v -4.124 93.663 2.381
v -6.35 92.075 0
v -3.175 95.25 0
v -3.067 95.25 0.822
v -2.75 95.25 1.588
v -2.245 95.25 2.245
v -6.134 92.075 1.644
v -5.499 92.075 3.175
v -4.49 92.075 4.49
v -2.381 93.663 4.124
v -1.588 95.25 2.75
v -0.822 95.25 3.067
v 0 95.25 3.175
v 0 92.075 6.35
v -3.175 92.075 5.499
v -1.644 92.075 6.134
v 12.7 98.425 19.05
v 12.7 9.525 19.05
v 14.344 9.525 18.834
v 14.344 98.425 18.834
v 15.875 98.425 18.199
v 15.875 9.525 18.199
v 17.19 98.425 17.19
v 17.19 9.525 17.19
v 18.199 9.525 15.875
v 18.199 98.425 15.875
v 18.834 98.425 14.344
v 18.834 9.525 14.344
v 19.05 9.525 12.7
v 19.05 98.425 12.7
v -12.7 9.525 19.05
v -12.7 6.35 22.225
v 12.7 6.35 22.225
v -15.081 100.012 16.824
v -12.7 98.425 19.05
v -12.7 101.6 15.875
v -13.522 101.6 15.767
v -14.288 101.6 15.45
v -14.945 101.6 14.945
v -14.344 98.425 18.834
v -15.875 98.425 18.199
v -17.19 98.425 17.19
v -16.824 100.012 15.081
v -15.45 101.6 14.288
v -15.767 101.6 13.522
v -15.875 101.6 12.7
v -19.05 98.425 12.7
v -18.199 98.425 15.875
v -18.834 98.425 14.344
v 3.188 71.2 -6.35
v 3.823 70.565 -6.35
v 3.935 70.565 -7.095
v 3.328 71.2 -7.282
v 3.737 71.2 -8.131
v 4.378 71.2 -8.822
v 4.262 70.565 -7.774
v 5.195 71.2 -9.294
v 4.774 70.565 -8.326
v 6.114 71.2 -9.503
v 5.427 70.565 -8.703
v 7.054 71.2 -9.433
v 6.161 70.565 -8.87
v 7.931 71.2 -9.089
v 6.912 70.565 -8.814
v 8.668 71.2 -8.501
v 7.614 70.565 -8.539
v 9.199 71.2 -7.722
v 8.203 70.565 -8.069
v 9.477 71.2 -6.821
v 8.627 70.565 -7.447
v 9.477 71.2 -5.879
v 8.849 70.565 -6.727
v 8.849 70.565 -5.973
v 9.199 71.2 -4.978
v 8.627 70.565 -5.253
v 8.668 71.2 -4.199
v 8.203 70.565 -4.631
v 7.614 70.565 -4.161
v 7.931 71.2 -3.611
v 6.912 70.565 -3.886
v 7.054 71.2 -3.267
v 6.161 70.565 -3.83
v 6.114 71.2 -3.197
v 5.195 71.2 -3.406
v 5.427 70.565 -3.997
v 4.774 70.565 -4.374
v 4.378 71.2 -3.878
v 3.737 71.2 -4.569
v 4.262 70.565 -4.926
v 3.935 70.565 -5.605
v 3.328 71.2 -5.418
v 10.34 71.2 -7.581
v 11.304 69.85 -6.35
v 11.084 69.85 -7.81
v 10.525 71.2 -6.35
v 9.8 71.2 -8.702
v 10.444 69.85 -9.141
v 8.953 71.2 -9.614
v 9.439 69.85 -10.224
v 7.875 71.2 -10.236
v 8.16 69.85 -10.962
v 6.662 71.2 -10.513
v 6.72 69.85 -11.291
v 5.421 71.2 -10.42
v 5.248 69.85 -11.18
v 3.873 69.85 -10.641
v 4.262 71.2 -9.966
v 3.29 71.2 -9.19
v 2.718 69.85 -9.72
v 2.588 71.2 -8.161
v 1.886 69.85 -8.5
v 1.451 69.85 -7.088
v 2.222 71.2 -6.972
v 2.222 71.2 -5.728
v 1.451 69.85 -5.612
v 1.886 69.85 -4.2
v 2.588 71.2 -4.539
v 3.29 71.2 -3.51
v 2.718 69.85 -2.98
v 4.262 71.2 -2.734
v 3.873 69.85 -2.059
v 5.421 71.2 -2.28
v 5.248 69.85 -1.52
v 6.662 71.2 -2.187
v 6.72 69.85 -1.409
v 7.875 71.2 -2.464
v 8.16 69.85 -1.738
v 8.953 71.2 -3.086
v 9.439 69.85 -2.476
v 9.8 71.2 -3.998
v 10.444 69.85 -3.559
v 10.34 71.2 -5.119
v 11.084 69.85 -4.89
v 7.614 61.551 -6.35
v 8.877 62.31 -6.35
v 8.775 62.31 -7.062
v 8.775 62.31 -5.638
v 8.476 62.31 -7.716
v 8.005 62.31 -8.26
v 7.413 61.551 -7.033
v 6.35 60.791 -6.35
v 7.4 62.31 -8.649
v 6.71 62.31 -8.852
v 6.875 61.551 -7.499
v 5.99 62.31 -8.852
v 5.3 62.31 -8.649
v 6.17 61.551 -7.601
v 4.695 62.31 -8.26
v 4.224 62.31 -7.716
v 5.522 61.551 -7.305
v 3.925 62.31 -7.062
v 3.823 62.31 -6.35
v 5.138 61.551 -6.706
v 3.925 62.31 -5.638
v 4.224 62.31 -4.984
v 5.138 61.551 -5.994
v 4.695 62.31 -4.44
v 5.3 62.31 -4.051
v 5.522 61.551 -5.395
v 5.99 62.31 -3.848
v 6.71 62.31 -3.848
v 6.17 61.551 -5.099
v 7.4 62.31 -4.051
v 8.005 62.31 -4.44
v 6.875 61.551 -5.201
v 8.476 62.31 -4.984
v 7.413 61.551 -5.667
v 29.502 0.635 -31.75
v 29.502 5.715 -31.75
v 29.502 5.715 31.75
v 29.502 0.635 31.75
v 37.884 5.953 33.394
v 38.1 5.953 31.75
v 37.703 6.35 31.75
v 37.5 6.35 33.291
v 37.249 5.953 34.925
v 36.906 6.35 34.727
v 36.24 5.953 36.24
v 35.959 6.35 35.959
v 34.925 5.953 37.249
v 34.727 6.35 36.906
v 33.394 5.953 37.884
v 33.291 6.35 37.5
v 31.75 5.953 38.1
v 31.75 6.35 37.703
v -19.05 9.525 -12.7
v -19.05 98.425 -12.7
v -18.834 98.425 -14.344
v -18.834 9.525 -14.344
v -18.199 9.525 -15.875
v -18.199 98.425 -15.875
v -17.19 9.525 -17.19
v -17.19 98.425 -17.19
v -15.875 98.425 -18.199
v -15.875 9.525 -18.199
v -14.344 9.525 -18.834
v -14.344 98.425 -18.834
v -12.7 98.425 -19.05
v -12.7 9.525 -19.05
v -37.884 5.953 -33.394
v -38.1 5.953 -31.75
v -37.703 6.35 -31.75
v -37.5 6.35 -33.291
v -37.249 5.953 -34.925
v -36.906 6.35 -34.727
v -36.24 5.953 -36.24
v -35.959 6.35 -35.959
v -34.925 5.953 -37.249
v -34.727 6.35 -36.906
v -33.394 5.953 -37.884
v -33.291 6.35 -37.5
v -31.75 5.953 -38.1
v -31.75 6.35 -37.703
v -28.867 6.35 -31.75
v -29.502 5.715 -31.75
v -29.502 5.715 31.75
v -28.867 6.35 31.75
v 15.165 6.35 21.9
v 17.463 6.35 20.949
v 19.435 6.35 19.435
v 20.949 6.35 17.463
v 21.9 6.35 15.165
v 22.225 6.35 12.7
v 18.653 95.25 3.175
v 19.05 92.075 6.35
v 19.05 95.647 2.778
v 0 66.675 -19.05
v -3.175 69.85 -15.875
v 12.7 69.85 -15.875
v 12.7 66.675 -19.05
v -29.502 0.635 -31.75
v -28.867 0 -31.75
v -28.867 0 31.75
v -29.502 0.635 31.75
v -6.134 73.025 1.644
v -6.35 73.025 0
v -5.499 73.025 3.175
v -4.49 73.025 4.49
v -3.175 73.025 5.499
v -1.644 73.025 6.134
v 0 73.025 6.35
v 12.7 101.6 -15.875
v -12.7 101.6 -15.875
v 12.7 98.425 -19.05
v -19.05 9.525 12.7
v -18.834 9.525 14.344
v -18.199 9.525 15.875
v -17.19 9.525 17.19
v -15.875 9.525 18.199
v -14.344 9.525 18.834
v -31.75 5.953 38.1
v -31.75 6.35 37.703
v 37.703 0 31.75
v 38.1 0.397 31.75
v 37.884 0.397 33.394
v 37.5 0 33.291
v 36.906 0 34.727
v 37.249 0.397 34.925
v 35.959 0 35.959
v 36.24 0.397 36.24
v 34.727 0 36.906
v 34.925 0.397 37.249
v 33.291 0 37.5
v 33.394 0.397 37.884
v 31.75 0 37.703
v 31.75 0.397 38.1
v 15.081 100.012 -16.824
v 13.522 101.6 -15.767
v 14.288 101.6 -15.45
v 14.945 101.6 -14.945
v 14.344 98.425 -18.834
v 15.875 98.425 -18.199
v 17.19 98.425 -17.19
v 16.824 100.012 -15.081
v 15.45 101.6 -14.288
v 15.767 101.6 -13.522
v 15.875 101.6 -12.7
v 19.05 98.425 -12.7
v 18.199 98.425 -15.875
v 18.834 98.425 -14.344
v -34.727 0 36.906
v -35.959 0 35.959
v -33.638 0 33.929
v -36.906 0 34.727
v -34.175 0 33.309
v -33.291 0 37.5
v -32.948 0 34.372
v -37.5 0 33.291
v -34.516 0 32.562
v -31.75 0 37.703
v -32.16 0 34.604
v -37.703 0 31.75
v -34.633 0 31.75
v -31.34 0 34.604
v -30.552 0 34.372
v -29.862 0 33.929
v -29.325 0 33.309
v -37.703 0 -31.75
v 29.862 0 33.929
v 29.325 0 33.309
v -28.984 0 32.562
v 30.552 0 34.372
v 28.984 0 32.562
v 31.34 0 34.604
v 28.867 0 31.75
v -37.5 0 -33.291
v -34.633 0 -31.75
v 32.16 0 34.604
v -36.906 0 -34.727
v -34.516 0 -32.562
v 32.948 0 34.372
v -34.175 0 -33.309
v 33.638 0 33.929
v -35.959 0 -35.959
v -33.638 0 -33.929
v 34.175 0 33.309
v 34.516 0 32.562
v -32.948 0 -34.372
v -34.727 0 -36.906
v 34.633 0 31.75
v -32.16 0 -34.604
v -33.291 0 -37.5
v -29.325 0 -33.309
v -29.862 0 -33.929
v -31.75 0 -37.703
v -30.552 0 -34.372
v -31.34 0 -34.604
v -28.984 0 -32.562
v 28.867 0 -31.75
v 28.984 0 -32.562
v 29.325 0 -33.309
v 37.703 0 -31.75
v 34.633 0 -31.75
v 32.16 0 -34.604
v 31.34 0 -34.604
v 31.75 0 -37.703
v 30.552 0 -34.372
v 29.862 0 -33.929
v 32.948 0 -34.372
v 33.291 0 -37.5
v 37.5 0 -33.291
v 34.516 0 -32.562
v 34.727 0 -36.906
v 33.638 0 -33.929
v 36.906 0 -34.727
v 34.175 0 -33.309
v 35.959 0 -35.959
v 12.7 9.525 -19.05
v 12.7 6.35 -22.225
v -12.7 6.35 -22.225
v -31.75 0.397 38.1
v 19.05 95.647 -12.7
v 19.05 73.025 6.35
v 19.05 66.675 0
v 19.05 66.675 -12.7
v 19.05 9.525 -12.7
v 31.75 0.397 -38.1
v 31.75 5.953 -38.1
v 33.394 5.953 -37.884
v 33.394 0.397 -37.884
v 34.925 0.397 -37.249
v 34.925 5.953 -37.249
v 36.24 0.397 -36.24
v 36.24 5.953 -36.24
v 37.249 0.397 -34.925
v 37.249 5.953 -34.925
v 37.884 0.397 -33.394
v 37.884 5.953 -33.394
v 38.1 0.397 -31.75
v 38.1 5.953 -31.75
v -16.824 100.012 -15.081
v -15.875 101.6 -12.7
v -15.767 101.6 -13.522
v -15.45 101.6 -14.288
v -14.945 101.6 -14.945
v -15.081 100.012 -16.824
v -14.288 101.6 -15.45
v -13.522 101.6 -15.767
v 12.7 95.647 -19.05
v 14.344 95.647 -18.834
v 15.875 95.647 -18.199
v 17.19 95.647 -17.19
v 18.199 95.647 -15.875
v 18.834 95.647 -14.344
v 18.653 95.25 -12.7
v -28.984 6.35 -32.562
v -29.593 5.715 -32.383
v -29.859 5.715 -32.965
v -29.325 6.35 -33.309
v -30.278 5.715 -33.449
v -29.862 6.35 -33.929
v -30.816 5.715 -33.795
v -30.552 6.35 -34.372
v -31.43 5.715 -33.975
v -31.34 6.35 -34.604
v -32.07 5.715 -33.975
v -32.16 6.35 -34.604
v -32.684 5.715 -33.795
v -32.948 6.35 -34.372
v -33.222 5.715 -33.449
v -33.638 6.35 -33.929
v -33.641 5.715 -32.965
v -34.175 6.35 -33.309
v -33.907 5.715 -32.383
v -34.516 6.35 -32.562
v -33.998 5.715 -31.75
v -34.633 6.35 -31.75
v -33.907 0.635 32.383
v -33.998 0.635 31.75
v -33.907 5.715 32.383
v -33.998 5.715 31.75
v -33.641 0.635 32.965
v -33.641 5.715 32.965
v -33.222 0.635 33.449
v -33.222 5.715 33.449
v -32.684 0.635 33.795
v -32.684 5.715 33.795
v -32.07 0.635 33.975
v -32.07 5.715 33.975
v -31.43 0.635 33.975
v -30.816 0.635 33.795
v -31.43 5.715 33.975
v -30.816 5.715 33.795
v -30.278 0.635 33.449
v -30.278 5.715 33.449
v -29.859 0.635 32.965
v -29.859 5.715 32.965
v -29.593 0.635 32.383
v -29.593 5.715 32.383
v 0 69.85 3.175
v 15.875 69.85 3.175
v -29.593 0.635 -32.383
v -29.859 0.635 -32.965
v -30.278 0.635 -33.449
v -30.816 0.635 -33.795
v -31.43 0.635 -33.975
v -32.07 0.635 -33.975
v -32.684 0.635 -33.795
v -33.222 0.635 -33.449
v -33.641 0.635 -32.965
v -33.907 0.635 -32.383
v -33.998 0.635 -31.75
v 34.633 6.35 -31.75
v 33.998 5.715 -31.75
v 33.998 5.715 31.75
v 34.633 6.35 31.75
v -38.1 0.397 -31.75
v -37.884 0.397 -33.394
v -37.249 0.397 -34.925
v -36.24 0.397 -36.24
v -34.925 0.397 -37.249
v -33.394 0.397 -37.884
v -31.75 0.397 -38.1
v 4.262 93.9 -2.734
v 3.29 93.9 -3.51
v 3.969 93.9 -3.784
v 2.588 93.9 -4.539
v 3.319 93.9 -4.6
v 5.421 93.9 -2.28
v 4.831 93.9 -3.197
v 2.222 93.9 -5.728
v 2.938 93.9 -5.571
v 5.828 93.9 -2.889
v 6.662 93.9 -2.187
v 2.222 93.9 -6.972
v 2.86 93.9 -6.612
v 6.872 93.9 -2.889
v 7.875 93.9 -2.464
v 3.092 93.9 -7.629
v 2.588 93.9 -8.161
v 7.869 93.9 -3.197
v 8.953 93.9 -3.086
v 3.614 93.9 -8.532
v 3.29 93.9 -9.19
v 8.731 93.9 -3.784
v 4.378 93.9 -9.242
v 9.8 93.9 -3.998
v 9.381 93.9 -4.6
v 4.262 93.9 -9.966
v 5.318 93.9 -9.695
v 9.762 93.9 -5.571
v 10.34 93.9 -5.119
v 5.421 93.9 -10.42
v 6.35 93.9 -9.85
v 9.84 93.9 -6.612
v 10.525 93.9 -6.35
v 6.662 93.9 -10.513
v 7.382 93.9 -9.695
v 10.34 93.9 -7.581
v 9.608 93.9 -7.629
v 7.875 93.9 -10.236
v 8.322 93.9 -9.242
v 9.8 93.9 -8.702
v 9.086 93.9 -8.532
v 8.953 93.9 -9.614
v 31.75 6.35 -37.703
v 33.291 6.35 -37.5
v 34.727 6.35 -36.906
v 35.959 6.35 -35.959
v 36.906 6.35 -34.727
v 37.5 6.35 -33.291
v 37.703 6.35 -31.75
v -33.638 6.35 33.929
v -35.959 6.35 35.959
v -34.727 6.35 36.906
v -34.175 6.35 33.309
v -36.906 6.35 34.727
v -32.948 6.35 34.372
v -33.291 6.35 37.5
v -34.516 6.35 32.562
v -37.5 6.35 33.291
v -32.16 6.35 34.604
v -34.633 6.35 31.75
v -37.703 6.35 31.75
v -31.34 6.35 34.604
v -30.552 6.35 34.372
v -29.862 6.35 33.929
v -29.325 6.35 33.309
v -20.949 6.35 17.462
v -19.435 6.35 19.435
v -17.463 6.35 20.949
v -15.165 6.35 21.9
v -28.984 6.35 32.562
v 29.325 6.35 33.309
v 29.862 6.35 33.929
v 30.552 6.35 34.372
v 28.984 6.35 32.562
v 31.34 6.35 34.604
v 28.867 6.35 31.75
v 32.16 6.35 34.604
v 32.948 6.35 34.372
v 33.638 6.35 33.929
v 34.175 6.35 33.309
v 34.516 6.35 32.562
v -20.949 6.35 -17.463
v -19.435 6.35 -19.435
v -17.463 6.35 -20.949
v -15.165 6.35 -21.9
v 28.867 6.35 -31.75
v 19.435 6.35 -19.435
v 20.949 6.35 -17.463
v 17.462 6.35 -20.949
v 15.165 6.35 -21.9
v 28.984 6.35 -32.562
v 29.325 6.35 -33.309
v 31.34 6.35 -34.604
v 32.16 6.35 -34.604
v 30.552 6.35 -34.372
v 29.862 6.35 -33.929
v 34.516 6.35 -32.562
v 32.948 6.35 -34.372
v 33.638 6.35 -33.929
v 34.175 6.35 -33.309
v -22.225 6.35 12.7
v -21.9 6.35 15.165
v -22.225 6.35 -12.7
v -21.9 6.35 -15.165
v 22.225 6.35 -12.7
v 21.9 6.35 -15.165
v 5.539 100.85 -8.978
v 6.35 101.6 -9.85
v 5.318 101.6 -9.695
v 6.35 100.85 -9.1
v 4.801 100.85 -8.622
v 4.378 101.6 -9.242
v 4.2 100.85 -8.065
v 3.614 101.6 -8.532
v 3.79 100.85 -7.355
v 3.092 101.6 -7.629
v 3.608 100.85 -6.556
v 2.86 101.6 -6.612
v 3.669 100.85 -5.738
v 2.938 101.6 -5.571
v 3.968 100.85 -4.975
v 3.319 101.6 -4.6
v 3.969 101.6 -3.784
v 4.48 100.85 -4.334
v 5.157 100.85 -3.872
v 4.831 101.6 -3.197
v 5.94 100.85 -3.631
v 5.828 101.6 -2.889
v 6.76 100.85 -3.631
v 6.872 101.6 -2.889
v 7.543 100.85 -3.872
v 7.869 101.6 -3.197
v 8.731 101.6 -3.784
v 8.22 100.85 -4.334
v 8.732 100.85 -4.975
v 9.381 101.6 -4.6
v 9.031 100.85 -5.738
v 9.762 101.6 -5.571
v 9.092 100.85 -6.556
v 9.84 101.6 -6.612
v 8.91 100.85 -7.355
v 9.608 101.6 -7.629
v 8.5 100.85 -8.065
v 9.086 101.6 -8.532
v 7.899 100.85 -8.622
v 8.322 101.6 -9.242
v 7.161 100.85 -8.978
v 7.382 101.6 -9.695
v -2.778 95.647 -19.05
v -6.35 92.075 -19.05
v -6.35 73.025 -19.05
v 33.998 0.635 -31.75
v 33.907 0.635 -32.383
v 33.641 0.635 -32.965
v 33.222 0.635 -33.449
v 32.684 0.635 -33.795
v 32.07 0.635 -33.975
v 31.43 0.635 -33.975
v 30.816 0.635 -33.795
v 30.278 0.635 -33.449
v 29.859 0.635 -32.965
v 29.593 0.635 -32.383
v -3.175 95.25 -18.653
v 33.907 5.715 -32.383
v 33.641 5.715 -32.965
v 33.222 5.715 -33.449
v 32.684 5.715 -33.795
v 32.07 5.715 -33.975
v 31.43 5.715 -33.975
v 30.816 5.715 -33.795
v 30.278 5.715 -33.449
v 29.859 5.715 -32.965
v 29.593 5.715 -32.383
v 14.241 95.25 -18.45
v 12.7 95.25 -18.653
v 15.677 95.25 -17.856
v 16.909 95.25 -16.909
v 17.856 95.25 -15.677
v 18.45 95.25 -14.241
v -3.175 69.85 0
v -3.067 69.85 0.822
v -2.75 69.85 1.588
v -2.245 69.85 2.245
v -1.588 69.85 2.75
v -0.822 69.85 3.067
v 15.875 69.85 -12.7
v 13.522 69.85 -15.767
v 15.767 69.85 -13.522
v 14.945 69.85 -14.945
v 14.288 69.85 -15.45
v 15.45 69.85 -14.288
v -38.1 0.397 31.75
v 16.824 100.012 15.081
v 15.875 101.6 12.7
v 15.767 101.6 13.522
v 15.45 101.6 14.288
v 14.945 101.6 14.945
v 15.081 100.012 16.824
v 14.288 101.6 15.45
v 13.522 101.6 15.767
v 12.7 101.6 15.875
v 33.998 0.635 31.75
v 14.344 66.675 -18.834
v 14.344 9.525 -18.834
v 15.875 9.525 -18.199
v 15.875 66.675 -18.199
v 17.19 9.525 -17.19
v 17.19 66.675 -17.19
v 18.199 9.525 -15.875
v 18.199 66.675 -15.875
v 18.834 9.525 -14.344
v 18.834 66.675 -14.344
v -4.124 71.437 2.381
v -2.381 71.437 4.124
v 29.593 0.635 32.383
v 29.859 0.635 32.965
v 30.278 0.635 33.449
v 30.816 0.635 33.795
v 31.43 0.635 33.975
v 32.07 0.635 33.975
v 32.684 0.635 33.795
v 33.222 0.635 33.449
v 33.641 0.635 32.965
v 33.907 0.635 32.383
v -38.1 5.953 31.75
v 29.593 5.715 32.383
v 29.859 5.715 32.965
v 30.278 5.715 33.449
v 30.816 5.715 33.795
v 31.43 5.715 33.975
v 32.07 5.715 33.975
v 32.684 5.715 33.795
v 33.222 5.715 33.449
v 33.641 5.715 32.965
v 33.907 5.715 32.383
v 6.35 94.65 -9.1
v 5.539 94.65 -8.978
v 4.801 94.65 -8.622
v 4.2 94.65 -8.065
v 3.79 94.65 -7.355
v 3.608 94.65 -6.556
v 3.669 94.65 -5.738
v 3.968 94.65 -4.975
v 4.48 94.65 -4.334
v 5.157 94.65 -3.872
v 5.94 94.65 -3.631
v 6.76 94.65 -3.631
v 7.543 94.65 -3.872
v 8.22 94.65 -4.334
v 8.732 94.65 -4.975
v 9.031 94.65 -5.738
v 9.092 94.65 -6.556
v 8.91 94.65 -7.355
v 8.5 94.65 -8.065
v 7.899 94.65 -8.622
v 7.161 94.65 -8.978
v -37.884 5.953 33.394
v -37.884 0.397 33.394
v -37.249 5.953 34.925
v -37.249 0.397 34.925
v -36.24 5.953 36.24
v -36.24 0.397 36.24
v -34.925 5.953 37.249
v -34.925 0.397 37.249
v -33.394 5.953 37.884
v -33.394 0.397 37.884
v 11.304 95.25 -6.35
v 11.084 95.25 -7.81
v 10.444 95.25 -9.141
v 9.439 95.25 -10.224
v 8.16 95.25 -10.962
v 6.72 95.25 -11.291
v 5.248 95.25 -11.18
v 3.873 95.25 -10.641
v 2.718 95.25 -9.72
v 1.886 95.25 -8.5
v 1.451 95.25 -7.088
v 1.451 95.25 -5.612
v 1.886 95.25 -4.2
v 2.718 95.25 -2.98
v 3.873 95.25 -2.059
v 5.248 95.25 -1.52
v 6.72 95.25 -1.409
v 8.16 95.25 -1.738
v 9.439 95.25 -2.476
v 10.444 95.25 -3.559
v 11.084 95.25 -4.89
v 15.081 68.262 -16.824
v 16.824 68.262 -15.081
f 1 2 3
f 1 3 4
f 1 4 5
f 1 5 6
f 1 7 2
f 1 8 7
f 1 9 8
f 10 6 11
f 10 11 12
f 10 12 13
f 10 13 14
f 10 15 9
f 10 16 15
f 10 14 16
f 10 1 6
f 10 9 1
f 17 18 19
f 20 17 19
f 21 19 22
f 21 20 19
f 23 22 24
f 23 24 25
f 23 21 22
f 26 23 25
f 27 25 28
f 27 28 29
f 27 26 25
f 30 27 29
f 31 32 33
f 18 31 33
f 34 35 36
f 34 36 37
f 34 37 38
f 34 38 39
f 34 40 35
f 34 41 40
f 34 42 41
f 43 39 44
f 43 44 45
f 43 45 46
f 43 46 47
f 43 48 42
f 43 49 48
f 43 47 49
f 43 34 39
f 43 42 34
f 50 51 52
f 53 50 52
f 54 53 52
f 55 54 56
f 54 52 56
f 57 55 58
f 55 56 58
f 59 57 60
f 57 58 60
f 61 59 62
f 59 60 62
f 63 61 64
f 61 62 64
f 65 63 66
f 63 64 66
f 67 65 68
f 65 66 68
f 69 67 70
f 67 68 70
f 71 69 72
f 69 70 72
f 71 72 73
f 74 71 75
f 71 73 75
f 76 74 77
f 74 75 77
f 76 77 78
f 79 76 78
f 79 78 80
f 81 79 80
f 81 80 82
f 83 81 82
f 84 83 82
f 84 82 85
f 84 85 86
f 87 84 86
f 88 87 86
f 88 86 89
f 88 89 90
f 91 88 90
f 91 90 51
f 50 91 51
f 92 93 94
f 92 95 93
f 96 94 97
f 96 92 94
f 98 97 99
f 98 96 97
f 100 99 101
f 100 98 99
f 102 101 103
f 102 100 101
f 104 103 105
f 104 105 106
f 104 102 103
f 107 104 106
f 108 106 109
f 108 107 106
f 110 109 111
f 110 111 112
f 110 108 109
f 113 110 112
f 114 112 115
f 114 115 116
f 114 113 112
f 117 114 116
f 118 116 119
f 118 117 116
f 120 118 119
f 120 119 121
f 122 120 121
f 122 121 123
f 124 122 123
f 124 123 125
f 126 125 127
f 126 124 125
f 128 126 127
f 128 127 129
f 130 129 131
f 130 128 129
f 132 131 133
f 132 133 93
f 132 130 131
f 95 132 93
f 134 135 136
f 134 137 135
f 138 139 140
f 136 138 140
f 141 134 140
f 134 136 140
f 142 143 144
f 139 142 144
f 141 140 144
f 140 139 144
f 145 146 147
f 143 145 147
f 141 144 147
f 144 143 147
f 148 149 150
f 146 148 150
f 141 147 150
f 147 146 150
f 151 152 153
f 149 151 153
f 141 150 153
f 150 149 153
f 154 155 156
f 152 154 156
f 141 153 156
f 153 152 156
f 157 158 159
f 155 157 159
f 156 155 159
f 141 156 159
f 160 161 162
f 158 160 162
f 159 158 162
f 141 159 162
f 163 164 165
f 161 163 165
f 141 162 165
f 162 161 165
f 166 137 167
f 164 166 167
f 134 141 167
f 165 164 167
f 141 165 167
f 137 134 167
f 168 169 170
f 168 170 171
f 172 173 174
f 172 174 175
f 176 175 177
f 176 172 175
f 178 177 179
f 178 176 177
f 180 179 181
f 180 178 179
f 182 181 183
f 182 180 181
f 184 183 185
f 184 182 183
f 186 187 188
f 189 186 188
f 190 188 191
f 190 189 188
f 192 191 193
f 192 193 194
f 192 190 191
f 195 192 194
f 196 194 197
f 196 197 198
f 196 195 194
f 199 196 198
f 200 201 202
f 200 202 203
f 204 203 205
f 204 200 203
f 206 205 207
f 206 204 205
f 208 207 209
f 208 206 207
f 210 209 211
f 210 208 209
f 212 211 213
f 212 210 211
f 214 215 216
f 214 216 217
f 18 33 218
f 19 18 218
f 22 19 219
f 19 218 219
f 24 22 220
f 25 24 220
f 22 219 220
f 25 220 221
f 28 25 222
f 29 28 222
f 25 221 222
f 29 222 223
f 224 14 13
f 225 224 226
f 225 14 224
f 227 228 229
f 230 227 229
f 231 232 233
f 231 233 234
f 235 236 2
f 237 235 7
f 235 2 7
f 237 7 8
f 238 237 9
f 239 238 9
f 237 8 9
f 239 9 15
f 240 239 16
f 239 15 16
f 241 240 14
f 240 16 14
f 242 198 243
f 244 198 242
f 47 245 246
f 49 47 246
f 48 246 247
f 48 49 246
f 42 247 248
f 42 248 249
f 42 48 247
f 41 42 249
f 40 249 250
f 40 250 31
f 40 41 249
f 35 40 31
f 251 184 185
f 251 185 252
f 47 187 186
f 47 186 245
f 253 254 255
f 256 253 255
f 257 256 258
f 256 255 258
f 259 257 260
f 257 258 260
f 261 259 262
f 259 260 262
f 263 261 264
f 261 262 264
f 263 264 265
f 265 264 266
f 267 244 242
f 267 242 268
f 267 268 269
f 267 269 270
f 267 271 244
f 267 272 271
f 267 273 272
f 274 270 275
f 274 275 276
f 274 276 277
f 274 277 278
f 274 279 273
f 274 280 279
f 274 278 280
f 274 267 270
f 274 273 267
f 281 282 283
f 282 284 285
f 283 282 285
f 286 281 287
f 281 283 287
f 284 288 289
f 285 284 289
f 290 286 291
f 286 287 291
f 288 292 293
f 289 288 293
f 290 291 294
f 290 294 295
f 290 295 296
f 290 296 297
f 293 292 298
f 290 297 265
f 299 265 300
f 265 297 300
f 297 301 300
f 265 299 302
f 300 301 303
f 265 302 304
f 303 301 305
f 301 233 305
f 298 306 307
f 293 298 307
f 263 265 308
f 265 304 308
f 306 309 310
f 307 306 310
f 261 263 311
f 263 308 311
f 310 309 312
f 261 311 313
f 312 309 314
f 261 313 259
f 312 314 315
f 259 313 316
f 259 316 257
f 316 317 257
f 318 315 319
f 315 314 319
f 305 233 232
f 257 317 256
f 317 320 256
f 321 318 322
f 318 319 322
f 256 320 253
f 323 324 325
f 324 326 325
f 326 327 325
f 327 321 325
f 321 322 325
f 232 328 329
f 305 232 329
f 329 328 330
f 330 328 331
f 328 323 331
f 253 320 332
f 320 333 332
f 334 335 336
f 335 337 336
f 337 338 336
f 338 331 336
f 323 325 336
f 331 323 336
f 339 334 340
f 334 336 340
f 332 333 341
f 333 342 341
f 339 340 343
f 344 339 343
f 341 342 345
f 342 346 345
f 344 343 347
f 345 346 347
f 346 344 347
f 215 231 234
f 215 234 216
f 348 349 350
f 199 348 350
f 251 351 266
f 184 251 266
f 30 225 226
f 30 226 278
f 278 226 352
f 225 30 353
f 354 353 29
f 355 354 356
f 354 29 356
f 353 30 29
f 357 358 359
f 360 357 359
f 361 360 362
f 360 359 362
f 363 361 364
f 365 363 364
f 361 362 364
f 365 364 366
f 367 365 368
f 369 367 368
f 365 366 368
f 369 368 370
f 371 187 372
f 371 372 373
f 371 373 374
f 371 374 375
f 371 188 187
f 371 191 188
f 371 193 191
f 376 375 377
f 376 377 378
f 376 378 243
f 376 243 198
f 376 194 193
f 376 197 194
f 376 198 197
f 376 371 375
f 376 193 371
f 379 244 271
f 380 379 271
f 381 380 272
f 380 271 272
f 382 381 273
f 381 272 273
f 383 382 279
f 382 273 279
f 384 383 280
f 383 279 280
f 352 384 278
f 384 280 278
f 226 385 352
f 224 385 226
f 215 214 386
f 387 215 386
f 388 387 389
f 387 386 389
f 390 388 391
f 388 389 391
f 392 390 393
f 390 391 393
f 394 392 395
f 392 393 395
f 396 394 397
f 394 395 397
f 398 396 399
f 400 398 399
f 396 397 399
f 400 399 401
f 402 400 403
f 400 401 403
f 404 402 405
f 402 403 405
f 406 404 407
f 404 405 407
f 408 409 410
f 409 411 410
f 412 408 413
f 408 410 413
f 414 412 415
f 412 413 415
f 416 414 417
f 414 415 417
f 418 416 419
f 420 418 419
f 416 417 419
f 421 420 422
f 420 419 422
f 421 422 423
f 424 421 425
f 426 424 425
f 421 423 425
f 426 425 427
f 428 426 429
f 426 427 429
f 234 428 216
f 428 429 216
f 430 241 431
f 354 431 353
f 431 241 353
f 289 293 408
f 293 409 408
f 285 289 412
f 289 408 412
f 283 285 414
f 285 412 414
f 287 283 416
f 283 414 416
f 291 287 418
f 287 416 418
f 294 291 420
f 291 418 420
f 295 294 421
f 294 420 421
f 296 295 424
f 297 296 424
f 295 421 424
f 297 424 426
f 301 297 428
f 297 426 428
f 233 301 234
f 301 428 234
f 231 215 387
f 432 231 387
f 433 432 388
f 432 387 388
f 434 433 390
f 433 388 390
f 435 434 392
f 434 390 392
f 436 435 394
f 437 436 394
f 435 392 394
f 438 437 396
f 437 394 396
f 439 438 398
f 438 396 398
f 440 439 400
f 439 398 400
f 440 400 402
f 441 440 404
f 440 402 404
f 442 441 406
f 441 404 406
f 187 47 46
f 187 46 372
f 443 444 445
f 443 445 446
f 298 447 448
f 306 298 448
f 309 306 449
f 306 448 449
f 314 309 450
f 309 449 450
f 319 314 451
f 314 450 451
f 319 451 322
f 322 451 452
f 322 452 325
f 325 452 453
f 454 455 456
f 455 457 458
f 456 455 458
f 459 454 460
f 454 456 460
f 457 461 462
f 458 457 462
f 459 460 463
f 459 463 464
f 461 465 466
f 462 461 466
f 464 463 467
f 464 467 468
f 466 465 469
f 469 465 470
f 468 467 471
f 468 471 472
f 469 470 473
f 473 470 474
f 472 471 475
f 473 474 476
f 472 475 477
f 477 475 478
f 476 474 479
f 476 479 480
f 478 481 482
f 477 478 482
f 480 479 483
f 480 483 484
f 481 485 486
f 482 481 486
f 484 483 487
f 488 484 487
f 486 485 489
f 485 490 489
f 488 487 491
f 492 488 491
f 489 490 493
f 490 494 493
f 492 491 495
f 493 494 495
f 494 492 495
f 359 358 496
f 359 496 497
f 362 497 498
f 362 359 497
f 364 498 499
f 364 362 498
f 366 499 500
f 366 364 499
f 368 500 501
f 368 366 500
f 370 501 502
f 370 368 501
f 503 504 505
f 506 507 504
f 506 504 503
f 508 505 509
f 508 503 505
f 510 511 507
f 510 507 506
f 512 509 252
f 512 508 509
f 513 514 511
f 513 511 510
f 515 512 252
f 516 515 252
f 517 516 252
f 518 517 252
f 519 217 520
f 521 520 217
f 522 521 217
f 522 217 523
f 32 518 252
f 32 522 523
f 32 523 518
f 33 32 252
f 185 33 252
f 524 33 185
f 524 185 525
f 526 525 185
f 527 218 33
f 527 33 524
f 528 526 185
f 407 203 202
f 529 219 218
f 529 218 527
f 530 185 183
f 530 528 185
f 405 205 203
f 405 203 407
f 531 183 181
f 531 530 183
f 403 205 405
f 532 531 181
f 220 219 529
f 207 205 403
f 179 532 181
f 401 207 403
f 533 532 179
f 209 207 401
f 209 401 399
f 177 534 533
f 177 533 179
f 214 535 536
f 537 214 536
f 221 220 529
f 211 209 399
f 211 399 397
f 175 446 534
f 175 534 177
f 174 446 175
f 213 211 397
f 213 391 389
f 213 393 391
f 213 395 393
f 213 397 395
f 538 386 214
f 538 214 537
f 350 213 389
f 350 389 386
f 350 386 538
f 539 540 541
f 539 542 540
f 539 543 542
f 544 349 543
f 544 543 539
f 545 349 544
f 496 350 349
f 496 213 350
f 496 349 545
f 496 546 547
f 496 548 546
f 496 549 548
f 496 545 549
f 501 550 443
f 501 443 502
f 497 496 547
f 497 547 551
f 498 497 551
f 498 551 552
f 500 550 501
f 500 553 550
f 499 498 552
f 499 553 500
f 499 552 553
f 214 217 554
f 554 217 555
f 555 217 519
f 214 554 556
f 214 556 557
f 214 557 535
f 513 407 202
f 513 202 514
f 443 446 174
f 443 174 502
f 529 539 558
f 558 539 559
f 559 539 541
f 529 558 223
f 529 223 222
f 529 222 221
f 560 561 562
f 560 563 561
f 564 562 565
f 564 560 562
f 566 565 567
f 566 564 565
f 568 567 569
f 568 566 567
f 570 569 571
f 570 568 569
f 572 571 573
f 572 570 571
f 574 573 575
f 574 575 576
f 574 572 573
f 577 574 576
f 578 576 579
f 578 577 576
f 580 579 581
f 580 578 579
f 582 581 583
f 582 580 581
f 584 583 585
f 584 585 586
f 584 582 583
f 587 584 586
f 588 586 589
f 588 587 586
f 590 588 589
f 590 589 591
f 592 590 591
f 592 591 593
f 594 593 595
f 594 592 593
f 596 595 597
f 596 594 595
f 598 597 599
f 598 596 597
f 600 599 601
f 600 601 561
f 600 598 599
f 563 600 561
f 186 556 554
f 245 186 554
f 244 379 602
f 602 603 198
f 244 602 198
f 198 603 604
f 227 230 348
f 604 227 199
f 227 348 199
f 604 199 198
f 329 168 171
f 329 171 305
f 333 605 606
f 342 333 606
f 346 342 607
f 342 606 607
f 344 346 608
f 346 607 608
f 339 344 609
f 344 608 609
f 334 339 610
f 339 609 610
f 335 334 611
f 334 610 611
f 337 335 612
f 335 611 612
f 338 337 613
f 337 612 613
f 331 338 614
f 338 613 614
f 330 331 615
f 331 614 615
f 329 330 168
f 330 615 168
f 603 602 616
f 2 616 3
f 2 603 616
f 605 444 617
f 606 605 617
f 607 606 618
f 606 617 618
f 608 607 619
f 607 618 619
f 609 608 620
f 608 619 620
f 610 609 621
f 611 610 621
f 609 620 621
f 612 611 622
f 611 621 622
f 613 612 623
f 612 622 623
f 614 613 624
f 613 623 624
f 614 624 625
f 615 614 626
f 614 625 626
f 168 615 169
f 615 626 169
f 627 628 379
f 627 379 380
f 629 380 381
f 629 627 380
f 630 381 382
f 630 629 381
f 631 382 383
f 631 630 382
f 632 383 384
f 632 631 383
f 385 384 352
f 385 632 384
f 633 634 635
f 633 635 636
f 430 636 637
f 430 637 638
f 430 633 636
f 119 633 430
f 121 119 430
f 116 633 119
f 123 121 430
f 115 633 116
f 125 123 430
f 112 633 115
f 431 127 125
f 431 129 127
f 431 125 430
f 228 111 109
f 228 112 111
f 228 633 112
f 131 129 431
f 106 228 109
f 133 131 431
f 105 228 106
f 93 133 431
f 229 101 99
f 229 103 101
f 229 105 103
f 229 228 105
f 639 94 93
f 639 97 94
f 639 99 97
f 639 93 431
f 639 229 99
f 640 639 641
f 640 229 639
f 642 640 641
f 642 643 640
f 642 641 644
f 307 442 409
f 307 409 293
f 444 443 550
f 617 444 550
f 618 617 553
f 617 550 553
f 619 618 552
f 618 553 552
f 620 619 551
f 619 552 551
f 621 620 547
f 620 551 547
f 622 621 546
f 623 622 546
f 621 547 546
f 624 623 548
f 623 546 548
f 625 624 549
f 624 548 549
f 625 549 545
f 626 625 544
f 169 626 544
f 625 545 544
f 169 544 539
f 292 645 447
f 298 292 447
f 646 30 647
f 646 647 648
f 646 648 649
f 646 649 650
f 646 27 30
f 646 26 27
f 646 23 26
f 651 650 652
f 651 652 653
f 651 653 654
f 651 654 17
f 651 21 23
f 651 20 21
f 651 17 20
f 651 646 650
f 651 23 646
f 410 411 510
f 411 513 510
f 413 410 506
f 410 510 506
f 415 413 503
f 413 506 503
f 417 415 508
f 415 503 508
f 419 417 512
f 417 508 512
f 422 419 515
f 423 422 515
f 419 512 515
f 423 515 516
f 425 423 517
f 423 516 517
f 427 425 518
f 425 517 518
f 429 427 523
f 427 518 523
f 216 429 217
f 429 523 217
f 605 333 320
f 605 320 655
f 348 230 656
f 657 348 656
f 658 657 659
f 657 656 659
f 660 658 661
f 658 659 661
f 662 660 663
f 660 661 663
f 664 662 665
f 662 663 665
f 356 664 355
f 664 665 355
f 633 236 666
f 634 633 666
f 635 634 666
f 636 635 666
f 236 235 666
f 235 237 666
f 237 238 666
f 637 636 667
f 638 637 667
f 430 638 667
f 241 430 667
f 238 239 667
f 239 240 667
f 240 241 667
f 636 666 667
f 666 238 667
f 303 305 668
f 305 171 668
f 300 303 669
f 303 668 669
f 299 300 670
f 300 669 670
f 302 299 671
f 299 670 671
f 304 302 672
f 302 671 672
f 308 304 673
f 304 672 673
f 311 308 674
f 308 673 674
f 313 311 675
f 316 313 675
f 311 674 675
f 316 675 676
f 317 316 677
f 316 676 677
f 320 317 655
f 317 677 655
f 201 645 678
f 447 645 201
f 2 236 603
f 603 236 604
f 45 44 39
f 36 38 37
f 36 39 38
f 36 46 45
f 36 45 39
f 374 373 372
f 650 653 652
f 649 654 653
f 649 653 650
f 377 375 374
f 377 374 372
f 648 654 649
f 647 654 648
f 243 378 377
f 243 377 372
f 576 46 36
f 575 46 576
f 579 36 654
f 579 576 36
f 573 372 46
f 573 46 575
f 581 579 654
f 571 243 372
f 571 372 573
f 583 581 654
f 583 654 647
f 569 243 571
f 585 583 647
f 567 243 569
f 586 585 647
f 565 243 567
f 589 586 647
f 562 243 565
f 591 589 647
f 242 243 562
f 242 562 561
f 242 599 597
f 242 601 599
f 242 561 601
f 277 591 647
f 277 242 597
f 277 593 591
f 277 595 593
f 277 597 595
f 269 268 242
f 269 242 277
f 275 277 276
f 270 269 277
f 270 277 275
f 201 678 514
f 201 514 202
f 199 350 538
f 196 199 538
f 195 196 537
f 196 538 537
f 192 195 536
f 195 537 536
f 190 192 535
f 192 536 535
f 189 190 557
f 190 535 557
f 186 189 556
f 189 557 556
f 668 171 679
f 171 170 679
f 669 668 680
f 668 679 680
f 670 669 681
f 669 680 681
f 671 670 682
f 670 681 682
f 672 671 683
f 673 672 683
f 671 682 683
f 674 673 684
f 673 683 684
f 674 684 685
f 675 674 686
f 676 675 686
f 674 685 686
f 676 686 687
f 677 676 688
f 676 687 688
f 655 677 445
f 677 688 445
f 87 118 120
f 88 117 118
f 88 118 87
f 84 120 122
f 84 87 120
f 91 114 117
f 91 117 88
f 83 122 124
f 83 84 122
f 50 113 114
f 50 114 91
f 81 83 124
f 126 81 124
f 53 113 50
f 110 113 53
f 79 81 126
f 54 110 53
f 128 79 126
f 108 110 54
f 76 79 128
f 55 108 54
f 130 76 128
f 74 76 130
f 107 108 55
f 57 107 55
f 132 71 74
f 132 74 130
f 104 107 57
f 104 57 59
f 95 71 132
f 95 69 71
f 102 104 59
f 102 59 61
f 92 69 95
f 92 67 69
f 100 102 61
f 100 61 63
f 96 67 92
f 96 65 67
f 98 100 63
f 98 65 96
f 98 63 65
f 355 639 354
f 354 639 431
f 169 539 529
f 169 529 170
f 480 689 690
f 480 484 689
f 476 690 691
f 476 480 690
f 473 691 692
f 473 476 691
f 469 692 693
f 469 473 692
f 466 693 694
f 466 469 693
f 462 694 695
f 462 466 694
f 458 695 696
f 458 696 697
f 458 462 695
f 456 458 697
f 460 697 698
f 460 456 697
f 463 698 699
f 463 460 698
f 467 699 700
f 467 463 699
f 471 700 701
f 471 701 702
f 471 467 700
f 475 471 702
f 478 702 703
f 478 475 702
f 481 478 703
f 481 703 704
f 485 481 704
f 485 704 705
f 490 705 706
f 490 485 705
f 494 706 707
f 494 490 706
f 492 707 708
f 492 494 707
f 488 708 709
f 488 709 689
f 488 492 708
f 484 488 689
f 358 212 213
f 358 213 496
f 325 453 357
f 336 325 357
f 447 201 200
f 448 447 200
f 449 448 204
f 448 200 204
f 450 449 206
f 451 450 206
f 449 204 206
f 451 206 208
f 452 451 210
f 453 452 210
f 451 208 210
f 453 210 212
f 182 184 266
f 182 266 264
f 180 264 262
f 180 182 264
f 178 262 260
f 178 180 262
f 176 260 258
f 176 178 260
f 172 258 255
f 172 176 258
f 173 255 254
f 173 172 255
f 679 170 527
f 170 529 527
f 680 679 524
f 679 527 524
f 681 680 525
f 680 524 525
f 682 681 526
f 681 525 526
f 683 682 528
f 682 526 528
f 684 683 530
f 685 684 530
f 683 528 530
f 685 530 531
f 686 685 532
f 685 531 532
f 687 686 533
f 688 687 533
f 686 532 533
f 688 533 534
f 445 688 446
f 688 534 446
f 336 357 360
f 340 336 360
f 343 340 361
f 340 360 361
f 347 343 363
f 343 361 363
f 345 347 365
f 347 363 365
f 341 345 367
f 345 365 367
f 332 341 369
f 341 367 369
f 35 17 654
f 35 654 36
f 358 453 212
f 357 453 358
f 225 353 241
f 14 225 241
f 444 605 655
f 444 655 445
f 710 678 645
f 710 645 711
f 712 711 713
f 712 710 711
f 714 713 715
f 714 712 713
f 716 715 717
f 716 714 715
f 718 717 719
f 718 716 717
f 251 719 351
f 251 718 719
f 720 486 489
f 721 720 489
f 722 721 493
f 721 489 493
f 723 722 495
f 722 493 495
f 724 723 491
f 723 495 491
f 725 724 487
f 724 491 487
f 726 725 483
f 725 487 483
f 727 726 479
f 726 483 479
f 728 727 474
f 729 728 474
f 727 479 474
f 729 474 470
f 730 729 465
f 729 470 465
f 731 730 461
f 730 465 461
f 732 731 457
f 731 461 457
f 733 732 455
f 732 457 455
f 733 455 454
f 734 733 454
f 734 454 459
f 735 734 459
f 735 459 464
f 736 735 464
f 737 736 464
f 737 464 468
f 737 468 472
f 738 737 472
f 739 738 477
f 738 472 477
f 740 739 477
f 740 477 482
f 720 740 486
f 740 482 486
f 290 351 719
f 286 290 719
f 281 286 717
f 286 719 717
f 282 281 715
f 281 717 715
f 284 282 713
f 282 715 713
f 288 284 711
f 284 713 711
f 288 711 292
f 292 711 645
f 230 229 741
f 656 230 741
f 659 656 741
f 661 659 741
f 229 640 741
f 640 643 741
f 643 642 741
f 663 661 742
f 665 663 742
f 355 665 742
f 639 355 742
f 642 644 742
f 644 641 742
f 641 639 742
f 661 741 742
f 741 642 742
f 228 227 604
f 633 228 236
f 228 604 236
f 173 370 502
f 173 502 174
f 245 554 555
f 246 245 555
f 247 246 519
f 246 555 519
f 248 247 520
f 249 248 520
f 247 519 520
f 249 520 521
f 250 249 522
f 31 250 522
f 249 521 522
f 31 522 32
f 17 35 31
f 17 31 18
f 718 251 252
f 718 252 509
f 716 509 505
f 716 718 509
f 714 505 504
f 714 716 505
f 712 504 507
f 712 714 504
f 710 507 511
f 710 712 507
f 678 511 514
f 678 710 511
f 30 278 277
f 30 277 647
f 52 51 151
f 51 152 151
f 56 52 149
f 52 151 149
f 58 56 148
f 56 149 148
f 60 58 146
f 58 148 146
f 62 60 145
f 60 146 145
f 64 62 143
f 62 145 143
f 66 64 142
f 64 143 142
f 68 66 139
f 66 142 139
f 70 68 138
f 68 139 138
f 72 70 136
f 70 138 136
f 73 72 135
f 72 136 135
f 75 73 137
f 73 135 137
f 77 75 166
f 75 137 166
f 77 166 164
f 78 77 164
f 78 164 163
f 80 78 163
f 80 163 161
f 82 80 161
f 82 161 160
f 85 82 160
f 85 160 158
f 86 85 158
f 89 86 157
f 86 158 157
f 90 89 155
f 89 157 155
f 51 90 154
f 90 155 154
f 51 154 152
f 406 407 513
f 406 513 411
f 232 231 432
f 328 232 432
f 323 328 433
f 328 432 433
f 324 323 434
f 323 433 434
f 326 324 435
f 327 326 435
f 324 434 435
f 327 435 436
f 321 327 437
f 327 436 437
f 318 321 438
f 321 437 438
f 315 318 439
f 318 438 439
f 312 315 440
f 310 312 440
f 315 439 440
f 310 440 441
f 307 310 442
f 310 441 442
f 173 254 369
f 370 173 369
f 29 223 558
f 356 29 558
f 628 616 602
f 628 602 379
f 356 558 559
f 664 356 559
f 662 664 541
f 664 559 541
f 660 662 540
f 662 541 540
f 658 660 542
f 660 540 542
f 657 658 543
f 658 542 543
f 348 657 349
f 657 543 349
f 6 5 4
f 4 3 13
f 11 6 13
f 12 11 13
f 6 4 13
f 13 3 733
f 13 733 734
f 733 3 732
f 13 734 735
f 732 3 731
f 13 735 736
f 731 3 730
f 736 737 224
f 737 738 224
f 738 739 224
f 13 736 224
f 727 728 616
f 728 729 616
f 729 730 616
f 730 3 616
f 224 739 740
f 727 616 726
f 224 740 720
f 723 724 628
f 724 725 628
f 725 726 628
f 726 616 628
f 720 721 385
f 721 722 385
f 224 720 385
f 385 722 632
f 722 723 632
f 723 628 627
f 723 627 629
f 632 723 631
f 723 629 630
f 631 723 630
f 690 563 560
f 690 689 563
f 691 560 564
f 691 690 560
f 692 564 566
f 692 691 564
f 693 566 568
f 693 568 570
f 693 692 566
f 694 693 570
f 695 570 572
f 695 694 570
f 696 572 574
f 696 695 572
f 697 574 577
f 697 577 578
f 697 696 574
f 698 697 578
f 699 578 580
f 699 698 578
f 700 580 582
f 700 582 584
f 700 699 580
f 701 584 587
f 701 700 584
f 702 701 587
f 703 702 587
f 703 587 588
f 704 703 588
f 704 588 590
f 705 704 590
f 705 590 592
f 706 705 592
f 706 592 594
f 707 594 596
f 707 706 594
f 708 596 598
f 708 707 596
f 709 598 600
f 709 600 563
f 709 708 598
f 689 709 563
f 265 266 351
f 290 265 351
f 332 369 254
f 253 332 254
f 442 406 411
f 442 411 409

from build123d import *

# Parameters (mm, degrees)
SKETCH1_W                            = 76.2
SKETCH1_H                            = 76.2
BOSS_EXTRUDE1_DEPTH                  = 6.35
SKETCH2_W                            = 38.1
SKETCH2_H                            = 38.1
BOSS_EXTRUDE2_DEPTH                  = 69.85
BOSS_EXTRUDE3_DEPTH                  = 95.25
BOSS_EXTRUDE4_START                  = 95.25
SKETCH2_5_W                          = 25.4
SKETCH2_5_H                          = 25.4
SKETCH2_5_R                          = 4.175
BOSS_EXTRUDE4_DEPTH                  = 6.35
BOSS_EXTRUDE6_START                  = 93.9
SKETCH2_7_R                          = 4.175
BOSS_EXTRUDE6_DEPTH                  = 1.35
BOSS_EXTRUDE6_DRAFT                  = -30
F_8_0_199_DIAMETER_HOLE1_D           = 5.0546
F_8_0_199_DIAMETER_HOLE1_DEPTH       = 8.89
F_8_0_199_DIAMETER_HOLE1_CSINK_D     = 6.3246
F_8_0_199_DIAMETER_HOLE1_CSINK_ANGLE = 90
F_8_0_199_DIAMETER_HOLE1_TIP         = 1.518555042
F_8_START                            = -31.75
F_8_CLEARANCE_SLOT1_DEPTH            = 63.5
FILLET2_R                            = 6.35
CHAMFER2_SIZE                        = 3.175
CHAMFER3_SIZE                        = 3.175
CHAMFER4_SIZE                        = 0.396875


with BuildPart() as part:
    # Sketch1 → Boss-Extrude1 (new body)
    with BuildSketch(Plane(origin=(0, 0, 0), x_dir=(1, 0, 0), z_dir=(0, 1, 0))):
        Rectangle(SKETCH1_W, SKETCH1_H)
    extrude(amount=BOSS_EXTRUDE1_DEPTH)

    # Sketch2 → Boss-Extrude2 (add)
    with BuildSketch(Plane(origin=(0, 0, 0), x_dir=(1, 0, 0), z_dir=(0, 1, 0))):
        Rectangle(SKETCH2_W, SKETCH2_H)
    extrude(amount=BOSS_EXTRUDE2_DEPTH)

    # Sketch2<3> → Boss-Extrude3 (add)
    with BuildSketch(Plane(origin=(0, 0, 0), x_dir=(1, 0, 0), z_dir=(0, 1, 0))):
        Polygon((-19.05, 19.05), (-19.05, -19.05), (19.05, -19.05), (19.05, -6.35), (-6.35, -6.35), (-6.35, 19.05), align=None)
    extrude(amount=BOSS_EXTRUDE3_DEPTH)

    # Sketch2<5> → Boss-Extrude4 (add)
    # profile 1 of 3: a face of its own
    with BuildSketch(Plane(origin=(0, 0, 0), x_dir=(1, 0, 0), z_dir=(0, 1, 0)).offset(BOSS_EXTRUDE4_START)):
        Polygon((-19.05, 19.05), (-19.05, -19.05), (19.05, -19.05), (19.05, -6.35), (-6.35, -6.35), (-6.35, 19.05), align=None)
    # profile 2 of 3: a face of its own
    with BuildSketch(Plane(origin=(0, 0, 0), x_dir=(1, 0, 0), z_dir=(0, 1, 0)).offset(BOSS_EXTRUDE4_START)):
        with Locations((6.35, 6.35)):
            Rectangle(SKETCH2_5_W, SKETCH2_5_H)
        with Locations((6.35, 6.35)):
            Circle(SKETCH2_5_R, mode=Mode.SUBTRACT)
    # profile 3 of 3: a face of its own
    with BuildSketch(Plane(origin=(0, 0, 0), x_dir=(1, 0, 0), z_dir=(0, 1, 0)).offset(BOSS_EXTRUDE4_START)):
        with Locations((6.35, 6.35)):
            Circle(SKETCH2_5_R)
    extrude(amount=BOSS_EXTRUDE4_DEPTH)

    # Boss-Extrude5: read off the stored shape, not the designer's step
    # Boss-Extrude5 outline → Boss-Extrude5 (revolve)
    with BuildSketch(Plane(origin=(6.35, 0, -6.35), x_dir=(1, 0, 0), z_dir=(0, 0, 1))):
        Polygon((4.175, 71.2), (0, 71.2), (0, 69.85), (4.954422863, 69.85), align=None)
    revolve(axis=Axis((6.35, 0, -6.35), (0, 1, 0)))


with BuildPart() as boss_extrude6_tool:
    # Sketch2<7> → Boss-Extrude6 (with draft: the straight prism first)
    with BuildSketch(Plane(origin=(0, 0, 0), x_dir=(1, 0, 0), z_dir=(0, 1, 0)).offset(BOSS_EXTRUDE6_START)):
        with Locations((6.35, 6.35)):
            Circle(SKETCH2_7_R)
    extrude(amount=BOSS_EXTRUDE6_DEPTH)
    # Boss-Extrude6: the draft: its side faces are tilted about the plane it starts from
    boss_extrude6_sides = [boss_extrude6_tool.faces().sort_by_distance(p)[0] for p in [
        (2.175, 94.575, -6.35),
    ]]
    draft(boss_extrude6_sides, Plane(origin=(0, 0, 0), x_dir=(1, 0, 0), z_dir=(0, 1, 0)).offset(BOSS_EXTRUDE6_START), BOSS_EXTRUDE6_DRAFT)


with BuildPart() as part_1:
    add(part.part)

    # Boss-Extrude6: add boss_extrude6_tool
    add(boss_extrude6_tool.part)

    # #8 (0.199) Diameter Hole1
    with Locations(Plane(origin=(0, 71.2, 0), x_dir=(1, 0, 0), z_dir=(0, 1, 0))):
        with Locations((6.35, 6.35)):
            CounterSinkHole(F_8_0_199_DIAMETER_HOLE1_D / 2, F_8_0_199_DIAMETER_HOLE1_CSINK_D / 2, depth=F_8_0_199_DIAMETER_HOLE1_DEPTH, counter_sink_angle=F_8_0_199_DIAMETER_HOLE1_CSINK_ANGLE)
            with Locations((0, 0, -(F_8_0_199_DIAMETER_HOLE1_DEPTH + F_8_0_199_DIAMETER_HOLE1_TIP / 2))):  # 118° drill point
                Cone(0, F_8_0_199_DIAMETER_HOLE1_D / 2, F_8_0_199_DIAMETER_HOLE1_TIP, mode=Mode.SUBTRACT)

    # Sketch8 → M5 Clearance Hole1 (revolve, cut)
    with BuildSketch(Plane(origin=(6.35, 93.9, -6.35), x_dir=(0, 0, -1), z_dir=(1, 0, 0))):
        Polygon((0, 0), (0, 7.7), (3.5, 7.7), (2.75, 6.95), (2.75, 0.75), (3.5, 0), align=None)
    revolve(axis=Axis((6.35, 87.55, -6.35), (0, 1, 0)), mode=Mode.SUBTRACT)

    # #8 Clearance Slot1: read off the stored shape, not the designer's step
    # #8 Clearance Slot1 outline → #8 Clearance Slot1 (cut)
    with BuildSketch(Plane.XY.offset(F_8_START)):
        Polygon((34.6329, 6.35), (28.8671, 6.35), (29.5021, 5.715), (29.5021, 0.635), (28.8671, 0), (34.6329, 0), (33.9979, 0.635), (33.9979, 5.715), align=None)
        Polygon((-29.5021, 5.715), (-28.8671, 6.35), (-34.6329, 6.35), (-33.9979, 5.715), (-33.9979, 0.635), (-34.6329, 0), (-28.8671, 0), (-29.5021, 0.635), align=None)
    extrude(amount=F_8_CLEARANCE_SLOT1_DEPTH, mode=Mode.SUBTRACT)

    # 8 Clearance Slot1 2 outline → 8 Clearance Slot1 2 (revolve, cut)
    with BuildSketch(Plane(origin=(31.75, 0, -31.75), x_dir=(1, 0, 0), z_dir=(0, 0, 1))):
        Polygon((0, 0), (2.8829, 0), (2.2479, 0.635), (2.2479, 5.715), (2.8829, 6.35), (0, 6.35), align=None)
    revolve(axis=Axis((31.75, 0, -31.75), (0, 1, 0)), mode=Mode.SUBTRACT)

    # 8 Clearance Slot1 3 outline → 8 Clearance Slot1 3 (revolve, cut)
    with BuildSketch(Plane(origin=(31.75, 0, 31.75), x_dir=(1, 0, 0), z_dir=(0, 0, 1))):
        Polygon((0, 0), (2.8829, 0), (2.2479, 0.635), (2.2479, 5.715), (2.8829, 6.35), (0, 6.35), align=None)
    revolve(axis=Axis((31.75, 0, 31.75), (0, 1, 0)), mode=Mode.SUBTRACT)

    # 8 Clearance Slot1 4 outline → 8 Clearance Slot1 4 (revolve, cut)
    with BuildSketch(Plane(origin=(-31.75, 0, -31.75), x_dir=(1, 0, 0), z_dir=(0, 0, 1))):
        Polygon((0, 0), (2.8829, 0), (2.2479, 0.635), (2.2479, 5.715), (2.8829, 6.35), (0, 6.35), align=None)
    revolve(axis=Axis((-31.75, 0, -31.75), (0, 1, 0)), mode=Mode.SUBTRACT)

    # 8 Clearance Slot1 5 outline → 8 Clearance Slot1 5 (revolve, cut)
    with BuildSketch(Plane(origin=(-31.75, 0, 31.75), x_dir=(1, 0, 0), z_dir=(0, 0, 1))):
        Polygon((0, 0), (2.8829, 0), (2.2479, 0.635), (2.2479, 5.715), (2.8829, 6.35), (0, 6.35), align=None)
    revolve(axis=Axis((-31.75, 0, 31.75), (0, 1, 0)), mode=Mode.SUBTRACT)

    # Fillet2
    fillet2_edges = [part_1.edges().sort_by_distance(p)[0] for p in [
        (19.05, 38.1, -19.05),
        (-19.05, 53.975, -19.05),
        (-19.05, 53.975, 19.05),
        (19.05, 53.975, 19.05),
        (-6.35, 82.55, 6.35),
        (19.05, 98.425, -19.05),
        (38.1, 3.175, 38.1),
        (-38.1, 3.175, 38.1),
        (-38.1, 3.175, -38.1),
        (38.1, 3.175, -38.1),
    ]]
    fillet(fillet2_edges, radius=FILLET2_R)

    # Chamfer2
    chamfer2_edges = [part_1.edges().sort_by_distance(p)[0] for p in [
        (-6.35, 69.85, -9.525),
        (9.525, 69.85, 6.35),
        (-4.490128061, 69.85, 4.490128061),
        (-4.490128061, 95.25, 4.490128061),
        (-19.05, 6.35, 0),
        (0, 6.35, -19.05),
        (19.05, 6.35, 0),
        (0, 6.35, 19.05),
        (-17.190128061, 6.35, -17.190128061),
        (17.190128061, 6.35, -17.190128061),
        (-17.190128061, 6.35, 17.190128061),
        (17.190128061, 6.35, 17.190128061),
        (-6.35, 95.25, -9.525),
        (9.525, 95.25, 6.35),
    ]]
    chamfer(chamfer2_edges, length=CHAMFER2_SIZE)

    # Chamfer3
    chamfer3_edges = [part_1.edges().sort_by_distance(p)[0] for p in [
        (17.190128061, 69.85, -17.190128061),
        (0, 101.6, -19.05),
        (19.05, 101.6, 0),
        (-19.05, 101.6, 0),
        (0, 101.6, 19.05),
        (17.190128061, 101.6, 17.190128061),
        (-17.190128061, 101.6, 17.190128061),
        (-17.190128061, 101.6, -17.190128061),
        (17.190128061, 101.6, -17.190128061),
        (19.05, 69.85, -4.7625),
        (4.7625, 69.85, -19.05),
    ]]
    chamfer(chamfer3_edges, length=CHAMFER3_SIZE)

    # Chamfer4
    chamfer4_edges = [part_1.edges().sort_by_distance(p)[0] for p in [
        (4.7625, 95.25, -19.05),
        (19.05, 95.25, -4.7625),
        (17.190128061, 95.25, -17.190128061),
        (-38.1, 0, 0),
        (-38.1, 6.35, 0),
        (38.1, 0, 0),
        (0, 0, 38.1),
        (0, 0, -38.1),
        (36.240128061, 0, -36.240128061),
        (36.240128061, 0, 36.240128061),
        (-36.240128061, 0, 36.240128061),
        (-36.240128061, 0, -36.240128061),
        (0, 6.35, -38.1),
        (38.1, 6.35, 0),
        (0, 6.35, 38.1),
        (36.240128061, 6.35, -36.240128061),
        (36.240128061, 6.35, 36.240128061),
        (-36.240128061, 6.35, 36.240128061),
        (-36.240128061, 6.35, -36.240128061),
    ]]
    chamfer(chamfer4_edges, length=CHAMFER4_SIZE)


solid = part_1.part
